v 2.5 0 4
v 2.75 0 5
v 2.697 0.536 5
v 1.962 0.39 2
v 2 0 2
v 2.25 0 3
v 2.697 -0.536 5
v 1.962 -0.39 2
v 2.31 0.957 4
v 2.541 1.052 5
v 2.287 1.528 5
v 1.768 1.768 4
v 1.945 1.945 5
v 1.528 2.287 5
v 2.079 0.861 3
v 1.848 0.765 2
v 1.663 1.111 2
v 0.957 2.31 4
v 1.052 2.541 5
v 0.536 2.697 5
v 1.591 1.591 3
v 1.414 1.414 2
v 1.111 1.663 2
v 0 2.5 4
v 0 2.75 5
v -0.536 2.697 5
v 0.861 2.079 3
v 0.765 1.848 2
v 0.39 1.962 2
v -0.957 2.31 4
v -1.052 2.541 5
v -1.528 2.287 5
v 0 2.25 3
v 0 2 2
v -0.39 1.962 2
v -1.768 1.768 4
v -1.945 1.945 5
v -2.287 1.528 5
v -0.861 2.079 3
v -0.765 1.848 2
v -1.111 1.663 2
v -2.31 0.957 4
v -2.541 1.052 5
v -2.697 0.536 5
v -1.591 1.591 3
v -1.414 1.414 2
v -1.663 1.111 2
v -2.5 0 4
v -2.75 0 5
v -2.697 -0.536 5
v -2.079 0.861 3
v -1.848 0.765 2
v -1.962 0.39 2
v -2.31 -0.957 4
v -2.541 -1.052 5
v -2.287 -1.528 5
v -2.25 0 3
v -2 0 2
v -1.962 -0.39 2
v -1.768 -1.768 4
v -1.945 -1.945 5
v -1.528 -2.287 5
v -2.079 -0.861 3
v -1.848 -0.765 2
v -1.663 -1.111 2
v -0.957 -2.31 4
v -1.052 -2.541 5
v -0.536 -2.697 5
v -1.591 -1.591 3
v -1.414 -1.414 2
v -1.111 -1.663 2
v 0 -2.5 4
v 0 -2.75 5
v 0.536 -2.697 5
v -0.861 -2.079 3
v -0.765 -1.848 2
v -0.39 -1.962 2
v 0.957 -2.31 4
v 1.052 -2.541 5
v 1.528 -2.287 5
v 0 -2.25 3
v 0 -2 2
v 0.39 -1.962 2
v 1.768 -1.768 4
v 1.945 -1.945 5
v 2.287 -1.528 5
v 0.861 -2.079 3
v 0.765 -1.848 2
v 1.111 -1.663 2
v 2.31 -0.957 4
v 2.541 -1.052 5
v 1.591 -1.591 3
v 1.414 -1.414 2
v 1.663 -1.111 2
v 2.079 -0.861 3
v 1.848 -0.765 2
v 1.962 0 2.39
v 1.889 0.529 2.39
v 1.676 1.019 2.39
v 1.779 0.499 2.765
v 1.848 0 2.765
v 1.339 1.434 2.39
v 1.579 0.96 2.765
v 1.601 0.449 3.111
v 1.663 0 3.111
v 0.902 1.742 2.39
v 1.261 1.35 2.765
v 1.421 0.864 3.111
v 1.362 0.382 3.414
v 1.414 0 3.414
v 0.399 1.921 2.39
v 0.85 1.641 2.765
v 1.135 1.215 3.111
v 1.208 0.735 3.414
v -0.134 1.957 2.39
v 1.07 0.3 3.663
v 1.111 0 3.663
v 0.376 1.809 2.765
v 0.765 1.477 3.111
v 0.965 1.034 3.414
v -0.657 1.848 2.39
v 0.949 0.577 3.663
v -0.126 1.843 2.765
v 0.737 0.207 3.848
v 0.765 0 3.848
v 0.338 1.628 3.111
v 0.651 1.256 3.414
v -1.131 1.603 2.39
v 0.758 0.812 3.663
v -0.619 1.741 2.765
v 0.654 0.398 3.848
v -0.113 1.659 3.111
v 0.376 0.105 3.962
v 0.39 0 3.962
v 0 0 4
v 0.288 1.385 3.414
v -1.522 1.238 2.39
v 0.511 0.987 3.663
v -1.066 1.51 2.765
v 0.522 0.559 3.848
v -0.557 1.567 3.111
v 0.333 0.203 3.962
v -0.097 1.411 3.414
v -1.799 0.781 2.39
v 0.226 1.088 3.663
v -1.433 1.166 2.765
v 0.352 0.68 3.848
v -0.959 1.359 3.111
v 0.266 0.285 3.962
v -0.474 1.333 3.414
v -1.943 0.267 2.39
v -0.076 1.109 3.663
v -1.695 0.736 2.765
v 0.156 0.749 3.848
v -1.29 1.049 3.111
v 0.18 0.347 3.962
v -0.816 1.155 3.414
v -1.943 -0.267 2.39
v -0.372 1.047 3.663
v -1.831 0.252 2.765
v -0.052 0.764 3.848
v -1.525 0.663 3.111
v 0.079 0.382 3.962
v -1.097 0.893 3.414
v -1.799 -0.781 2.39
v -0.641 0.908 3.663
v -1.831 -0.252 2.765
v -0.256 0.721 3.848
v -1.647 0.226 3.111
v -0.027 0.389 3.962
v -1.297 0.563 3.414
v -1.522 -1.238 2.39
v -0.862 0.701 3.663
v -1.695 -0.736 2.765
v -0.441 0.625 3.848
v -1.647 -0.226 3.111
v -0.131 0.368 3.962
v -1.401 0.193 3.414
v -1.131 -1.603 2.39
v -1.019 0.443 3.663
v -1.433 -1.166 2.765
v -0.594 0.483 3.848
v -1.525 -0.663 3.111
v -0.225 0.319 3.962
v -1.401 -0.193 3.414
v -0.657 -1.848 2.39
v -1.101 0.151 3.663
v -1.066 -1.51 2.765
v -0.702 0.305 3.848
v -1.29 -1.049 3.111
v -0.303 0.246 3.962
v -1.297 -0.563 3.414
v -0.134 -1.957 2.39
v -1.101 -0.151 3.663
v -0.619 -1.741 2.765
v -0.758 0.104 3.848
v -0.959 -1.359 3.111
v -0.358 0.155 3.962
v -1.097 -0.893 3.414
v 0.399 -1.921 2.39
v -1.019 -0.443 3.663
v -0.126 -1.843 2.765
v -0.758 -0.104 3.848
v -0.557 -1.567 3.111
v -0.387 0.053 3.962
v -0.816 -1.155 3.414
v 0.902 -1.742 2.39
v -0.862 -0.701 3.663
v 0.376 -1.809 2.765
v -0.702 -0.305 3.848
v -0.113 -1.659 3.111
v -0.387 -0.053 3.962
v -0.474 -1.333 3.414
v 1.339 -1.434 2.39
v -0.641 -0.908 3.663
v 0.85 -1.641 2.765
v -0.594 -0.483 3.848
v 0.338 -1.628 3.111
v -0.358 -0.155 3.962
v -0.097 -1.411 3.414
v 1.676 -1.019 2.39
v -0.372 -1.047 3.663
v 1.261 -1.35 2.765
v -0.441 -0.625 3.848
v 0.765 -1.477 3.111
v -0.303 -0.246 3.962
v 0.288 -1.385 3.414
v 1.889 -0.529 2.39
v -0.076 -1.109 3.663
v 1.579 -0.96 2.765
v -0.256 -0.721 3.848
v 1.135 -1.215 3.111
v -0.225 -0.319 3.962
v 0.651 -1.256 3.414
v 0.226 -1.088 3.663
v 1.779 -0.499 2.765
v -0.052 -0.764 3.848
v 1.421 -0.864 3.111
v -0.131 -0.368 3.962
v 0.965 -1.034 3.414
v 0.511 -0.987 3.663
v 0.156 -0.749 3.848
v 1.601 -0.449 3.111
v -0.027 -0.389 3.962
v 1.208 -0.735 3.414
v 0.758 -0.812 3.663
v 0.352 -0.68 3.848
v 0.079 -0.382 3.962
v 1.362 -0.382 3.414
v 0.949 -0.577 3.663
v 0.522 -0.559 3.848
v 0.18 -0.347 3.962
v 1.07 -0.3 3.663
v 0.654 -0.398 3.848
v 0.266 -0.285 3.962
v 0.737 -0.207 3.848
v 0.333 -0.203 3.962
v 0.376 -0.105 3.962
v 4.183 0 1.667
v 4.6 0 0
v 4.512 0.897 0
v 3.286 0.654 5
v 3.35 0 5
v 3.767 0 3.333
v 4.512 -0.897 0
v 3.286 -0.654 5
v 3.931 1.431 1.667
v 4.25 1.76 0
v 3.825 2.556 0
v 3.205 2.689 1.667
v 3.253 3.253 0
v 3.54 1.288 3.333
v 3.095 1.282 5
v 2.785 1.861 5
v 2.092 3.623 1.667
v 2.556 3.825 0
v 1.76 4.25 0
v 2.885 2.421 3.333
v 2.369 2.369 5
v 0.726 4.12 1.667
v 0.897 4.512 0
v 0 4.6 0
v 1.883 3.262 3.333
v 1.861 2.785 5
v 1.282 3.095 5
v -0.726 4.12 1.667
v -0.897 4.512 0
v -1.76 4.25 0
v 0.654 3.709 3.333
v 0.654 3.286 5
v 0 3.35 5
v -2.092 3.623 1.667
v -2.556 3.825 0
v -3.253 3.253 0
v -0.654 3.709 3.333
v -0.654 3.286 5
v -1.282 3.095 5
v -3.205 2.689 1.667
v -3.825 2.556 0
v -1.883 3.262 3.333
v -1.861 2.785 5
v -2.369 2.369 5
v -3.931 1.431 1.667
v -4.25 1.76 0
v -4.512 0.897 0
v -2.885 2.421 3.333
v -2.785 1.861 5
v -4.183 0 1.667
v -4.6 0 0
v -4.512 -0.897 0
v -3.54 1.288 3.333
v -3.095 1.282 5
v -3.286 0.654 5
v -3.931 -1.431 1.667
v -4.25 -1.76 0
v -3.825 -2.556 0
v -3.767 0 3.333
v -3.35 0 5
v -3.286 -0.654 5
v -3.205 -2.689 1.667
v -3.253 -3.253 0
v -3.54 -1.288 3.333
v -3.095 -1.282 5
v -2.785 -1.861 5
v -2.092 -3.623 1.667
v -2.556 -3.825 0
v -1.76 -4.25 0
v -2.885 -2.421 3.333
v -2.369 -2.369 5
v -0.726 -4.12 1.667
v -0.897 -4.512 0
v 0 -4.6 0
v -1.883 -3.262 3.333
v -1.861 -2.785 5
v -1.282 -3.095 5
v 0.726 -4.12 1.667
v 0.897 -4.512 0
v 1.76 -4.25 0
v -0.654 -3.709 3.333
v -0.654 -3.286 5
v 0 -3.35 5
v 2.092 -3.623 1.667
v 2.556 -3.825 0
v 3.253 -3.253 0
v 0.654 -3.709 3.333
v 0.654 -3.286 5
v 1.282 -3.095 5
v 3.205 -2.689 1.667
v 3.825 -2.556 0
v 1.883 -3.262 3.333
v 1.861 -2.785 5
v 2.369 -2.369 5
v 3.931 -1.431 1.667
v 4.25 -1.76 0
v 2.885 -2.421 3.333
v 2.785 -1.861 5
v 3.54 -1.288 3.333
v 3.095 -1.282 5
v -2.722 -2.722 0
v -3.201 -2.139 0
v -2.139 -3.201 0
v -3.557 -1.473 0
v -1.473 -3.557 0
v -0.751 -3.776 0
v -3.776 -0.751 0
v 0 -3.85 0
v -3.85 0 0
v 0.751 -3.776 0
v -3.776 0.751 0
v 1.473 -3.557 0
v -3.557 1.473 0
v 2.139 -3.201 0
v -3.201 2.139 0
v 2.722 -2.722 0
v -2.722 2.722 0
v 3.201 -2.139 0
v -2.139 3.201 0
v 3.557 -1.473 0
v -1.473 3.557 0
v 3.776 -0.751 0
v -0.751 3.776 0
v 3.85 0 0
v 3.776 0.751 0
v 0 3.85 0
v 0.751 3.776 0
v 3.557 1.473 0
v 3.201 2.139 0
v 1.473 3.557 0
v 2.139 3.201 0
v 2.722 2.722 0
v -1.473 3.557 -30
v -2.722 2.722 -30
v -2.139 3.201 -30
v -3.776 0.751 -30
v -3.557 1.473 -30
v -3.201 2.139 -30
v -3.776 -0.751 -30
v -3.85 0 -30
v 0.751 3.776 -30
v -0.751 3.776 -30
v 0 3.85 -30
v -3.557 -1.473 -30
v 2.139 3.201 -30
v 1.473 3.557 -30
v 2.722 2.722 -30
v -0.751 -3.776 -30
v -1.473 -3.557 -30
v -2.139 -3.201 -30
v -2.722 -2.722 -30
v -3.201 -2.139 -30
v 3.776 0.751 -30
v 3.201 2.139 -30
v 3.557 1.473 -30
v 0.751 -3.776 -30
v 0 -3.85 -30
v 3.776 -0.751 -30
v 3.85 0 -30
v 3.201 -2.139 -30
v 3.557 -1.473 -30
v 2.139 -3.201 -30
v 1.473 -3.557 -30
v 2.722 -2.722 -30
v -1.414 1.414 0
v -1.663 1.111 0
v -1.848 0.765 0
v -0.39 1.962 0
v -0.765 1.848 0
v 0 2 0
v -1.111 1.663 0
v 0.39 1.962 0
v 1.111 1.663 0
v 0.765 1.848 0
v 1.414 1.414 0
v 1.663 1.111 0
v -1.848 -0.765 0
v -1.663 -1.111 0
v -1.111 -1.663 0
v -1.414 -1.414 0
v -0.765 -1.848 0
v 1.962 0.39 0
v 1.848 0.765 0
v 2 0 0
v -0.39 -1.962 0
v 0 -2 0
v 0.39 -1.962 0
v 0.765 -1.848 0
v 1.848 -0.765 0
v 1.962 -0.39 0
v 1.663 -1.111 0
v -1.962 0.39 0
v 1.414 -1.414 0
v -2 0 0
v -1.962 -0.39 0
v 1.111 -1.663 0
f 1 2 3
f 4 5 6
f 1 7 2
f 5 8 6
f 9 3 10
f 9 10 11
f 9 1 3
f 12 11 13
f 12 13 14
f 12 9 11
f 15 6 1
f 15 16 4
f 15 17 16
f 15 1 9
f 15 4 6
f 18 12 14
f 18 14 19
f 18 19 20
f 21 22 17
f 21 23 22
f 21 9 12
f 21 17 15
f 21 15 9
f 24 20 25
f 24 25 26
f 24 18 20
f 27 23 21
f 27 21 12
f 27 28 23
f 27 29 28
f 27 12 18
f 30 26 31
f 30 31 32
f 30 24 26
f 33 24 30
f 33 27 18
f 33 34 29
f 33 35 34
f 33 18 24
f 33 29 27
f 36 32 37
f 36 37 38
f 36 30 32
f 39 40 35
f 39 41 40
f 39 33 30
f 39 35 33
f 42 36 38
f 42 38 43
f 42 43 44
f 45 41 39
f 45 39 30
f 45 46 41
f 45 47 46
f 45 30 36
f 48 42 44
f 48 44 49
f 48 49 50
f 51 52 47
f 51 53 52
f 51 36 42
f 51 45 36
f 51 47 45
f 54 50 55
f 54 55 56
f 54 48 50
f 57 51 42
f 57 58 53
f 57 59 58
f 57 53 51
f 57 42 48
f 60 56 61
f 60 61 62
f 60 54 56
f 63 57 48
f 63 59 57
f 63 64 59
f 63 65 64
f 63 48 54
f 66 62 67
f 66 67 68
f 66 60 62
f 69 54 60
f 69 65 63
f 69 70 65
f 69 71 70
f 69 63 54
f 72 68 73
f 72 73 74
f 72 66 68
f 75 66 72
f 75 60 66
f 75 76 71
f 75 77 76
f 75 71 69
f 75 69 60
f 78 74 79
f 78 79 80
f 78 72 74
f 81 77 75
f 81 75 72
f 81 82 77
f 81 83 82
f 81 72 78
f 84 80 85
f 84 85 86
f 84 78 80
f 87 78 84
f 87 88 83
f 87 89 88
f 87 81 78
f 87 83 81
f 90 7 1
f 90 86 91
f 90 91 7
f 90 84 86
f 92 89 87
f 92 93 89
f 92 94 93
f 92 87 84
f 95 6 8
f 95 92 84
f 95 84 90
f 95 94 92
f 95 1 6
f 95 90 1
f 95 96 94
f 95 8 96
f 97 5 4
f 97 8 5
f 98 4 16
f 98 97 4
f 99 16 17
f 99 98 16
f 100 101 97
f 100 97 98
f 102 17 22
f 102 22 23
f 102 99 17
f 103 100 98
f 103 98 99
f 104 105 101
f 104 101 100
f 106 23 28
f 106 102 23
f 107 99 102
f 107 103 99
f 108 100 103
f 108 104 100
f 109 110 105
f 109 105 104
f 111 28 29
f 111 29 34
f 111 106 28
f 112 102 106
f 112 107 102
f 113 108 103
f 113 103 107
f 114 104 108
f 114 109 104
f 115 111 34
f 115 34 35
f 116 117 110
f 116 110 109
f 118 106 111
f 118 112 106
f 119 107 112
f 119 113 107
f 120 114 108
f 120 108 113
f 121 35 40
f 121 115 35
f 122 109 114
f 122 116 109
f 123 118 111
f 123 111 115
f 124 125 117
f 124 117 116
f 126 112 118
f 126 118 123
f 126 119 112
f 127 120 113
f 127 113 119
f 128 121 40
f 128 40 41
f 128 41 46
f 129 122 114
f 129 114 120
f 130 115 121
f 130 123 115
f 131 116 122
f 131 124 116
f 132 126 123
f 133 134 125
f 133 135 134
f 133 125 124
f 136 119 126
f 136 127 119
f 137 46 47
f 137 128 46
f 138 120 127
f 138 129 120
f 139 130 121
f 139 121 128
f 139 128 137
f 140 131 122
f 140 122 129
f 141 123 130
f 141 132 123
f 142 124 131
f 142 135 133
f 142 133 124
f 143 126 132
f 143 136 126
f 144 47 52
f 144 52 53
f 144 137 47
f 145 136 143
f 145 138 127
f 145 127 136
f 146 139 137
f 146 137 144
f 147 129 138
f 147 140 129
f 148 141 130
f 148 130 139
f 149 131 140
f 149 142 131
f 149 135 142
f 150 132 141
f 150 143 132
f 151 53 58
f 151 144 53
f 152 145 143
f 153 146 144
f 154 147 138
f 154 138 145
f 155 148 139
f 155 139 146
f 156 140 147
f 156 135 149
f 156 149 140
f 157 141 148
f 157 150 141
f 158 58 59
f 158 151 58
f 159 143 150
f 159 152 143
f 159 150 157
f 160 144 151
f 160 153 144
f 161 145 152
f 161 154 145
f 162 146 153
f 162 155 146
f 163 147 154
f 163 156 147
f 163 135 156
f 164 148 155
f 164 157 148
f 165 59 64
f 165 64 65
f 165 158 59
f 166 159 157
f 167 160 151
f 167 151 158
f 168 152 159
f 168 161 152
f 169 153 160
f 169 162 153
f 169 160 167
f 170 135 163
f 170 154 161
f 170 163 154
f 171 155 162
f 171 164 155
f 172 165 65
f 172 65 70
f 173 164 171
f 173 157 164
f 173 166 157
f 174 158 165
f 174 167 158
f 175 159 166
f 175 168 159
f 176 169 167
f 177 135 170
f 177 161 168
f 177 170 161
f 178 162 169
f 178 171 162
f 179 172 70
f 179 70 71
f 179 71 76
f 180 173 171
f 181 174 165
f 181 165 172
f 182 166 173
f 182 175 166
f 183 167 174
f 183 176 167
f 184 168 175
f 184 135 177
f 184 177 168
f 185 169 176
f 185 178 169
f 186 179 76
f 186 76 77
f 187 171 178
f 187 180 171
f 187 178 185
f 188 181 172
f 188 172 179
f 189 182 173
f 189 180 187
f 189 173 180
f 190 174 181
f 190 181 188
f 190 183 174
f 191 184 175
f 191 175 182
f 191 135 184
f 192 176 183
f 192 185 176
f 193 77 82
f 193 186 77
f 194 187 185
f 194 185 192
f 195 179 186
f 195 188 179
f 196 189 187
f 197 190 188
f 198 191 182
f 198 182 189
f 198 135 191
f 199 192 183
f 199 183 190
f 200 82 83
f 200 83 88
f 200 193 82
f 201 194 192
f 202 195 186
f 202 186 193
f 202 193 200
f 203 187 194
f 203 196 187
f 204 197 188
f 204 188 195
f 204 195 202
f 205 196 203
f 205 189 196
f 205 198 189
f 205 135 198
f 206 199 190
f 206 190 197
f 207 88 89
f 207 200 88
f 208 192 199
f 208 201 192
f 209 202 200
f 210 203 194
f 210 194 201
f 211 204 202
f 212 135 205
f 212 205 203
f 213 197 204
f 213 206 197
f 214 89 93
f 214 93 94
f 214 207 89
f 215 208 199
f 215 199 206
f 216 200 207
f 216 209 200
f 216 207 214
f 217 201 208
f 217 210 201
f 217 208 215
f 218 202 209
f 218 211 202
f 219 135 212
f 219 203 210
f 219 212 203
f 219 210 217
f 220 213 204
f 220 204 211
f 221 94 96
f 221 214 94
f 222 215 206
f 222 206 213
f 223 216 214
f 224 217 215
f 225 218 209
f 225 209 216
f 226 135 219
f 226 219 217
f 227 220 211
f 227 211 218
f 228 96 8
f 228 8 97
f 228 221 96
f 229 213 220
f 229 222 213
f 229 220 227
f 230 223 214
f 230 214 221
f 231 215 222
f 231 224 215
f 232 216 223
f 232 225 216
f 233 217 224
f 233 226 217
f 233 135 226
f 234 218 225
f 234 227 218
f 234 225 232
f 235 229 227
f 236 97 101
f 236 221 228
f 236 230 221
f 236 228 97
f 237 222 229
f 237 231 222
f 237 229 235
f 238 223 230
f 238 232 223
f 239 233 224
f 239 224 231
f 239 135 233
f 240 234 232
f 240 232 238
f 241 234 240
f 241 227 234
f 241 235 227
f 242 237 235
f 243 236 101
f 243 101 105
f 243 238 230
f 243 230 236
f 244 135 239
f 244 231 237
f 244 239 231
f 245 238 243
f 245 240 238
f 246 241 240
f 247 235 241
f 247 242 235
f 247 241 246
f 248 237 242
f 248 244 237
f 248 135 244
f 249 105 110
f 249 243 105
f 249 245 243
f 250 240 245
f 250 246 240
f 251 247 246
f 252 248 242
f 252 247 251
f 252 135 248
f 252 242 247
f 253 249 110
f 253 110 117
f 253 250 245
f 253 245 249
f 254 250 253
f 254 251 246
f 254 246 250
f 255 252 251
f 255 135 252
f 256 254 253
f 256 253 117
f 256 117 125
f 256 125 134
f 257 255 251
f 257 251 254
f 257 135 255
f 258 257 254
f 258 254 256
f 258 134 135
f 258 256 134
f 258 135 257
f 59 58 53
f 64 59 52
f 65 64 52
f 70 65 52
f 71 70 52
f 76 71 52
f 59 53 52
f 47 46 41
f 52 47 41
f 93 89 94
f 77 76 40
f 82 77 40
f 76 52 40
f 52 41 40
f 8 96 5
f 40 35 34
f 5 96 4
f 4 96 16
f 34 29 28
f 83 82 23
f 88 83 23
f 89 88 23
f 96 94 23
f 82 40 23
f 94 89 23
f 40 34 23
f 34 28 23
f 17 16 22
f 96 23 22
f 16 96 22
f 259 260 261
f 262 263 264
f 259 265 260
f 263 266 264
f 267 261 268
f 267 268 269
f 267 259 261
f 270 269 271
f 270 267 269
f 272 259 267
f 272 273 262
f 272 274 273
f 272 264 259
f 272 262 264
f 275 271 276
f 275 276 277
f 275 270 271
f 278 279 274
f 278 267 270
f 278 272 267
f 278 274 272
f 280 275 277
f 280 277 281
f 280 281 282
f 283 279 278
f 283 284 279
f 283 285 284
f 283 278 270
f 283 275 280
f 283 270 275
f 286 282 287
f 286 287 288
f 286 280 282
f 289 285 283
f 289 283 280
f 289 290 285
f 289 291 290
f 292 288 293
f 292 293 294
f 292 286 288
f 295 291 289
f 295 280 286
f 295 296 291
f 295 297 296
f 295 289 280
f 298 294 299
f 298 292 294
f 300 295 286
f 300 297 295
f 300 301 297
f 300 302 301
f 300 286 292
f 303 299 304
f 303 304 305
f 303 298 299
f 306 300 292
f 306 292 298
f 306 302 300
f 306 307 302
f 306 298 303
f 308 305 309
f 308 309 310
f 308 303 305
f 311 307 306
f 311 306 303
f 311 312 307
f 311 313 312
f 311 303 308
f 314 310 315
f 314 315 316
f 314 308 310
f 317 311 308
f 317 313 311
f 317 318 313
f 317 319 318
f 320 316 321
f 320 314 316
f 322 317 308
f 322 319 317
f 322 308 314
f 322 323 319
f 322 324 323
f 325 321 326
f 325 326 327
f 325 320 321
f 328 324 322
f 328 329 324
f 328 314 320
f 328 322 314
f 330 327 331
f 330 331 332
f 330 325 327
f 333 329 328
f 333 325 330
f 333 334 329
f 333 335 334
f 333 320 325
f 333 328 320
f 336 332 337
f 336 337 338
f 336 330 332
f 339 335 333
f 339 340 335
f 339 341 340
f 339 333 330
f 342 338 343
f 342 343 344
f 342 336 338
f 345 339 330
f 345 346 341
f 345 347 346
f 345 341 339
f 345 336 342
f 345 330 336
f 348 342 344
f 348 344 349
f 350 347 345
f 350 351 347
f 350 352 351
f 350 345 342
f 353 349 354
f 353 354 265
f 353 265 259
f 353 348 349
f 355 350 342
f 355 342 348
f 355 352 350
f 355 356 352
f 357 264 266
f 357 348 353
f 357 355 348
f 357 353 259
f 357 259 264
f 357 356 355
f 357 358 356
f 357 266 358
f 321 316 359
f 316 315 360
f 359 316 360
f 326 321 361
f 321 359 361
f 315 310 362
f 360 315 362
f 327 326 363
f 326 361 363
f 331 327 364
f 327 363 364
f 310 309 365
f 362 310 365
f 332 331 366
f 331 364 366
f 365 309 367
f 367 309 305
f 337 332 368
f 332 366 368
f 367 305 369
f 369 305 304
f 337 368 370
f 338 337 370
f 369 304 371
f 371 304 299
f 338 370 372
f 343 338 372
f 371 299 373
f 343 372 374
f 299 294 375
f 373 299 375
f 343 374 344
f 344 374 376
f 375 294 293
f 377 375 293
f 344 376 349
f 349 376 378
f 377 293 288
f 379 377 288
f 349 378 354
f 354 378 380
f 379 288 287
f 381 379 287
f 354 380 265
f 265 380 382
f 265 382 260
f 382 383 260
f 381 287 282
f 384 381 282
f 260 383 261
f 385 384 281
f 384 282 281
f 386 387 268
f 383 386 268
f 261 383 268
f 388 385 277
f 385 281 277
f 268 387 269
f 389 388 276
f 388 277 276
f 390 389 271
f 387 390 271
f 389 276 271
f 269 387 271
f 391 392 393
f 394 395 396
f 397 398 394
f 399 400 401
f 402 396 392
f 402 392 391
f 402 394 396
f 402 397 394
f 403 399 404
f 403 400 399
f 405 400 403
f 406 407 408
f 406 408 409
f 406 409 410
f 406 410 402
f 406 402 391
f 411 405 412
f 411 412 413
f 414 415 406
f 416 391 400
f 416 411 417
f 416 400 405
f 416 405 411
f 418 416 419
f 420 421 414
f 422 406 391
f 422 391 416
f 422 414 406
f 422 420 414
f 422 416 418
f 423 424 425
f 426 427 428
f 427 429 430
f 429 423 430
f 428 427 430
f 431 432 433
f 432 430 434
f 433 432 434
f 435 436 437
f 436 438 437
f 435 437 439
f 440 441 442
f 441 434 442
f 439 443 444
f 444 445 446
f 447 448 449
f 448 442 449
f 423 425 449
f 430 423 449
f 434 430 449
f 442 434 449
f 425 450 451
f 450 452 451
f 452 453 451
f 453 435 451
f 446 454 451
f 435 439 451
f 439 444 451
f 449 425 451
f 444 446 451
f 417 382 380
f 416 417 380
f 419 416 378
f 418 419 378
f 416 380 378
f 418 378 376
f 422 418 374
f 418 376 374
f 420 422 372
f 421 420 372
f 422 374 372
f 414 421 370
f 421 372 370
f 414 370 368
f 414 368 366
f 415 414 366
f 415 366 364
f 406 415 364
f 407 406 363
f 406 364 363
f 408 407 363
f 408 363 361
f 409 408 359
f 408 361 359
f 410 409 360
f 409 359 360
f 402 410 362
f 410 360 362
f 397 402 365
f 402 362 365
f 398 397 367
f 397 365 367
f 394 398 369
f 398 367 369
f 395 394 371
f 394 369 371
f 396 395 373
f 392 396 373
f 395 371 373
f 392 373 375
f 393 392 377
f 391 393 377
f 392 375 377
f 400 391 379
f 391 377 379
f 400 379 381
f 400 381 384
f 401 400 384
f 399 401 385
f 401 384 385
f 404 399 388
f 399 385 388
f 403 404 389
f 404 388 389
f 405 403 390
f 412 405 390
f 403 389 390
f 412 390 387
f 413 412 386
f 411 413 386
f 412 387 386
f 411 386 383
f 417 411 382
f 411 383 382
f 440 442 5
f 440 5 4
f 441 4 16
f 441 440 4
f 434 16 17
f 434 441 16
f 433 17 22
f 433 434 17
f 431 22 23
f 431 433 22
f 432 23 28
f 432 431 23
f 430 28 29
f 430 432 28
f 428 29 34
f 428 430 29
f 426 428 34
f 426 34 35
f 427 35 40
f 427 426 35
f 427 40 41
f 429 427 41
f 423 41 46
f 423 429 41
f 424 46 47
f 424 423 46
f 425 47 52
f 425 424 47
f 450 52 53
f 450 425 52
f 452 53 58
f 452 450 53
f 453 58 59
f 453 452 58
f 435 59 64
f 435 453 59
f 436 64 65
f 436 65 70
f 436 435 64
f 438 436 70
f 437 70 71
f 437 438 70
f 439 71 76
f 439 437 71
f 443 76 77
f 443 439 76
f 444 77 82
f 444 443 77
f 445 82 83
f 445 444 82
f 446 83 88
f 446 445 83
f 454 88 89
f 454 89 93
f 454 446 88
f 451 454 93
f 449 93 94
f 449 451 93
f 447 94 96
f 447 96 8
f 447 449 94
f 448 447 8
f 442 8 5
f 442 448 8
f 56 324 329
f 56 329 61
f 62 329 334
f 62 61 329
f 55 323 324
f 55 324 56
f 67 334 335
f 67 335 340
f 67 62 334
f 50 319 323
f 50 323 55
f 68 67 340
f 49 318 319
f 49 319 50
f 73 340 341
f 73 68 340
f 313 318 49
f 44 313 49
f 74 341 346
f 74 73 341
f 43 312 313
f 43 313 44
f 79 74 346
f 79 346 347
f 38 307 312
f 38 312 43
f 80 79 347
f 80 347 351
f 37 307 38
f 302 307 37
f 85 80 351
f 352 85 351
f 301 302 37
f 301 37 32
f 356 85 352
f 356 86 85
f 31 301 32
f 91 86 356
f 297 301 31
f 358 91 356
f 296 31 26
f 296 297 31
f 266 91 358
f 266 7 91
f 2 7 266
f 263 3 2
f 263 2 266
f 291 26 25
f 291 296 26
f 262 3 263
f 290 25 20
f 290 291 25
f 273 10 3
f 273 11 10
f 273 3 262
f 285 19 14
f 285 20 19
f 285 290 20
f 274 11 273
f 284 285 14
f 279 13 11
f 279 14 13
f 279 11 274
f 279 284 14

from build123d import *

# Parameters (mm, degrees)
ESQUISSE1_R        = 4.85
ESQUISSE1_R_2      = 2
BOSS_EXTRU_1_DEPTH = 5
CHANFREIN1_SIZE    = 6
CHANFREIN1_SIZE_2  = 1.5
CHANFREIN2_SIZE    = 0.75
CHANFREIN2_SIZE2   = 3
ESQUISSE4_R        = 2
BOSS_EXTRU_2_DEPTH = 2
CONG_1_R           = 2
ESQUISSE5_R        = 3.85
BOSS_EXTRU_3_DEPTH = 30


# Some blends are built 0.0001 mm under size
with BuildPart() as part:
    # Esquisse1 → Boss.-Extru.1 (new body)
    with BuildSketch(Plane.XY):
        Circle(ESQUISSE1_R)
        Circle(ESQUISSE1_R_2, mode=Mode.SUBTRACT)
    extrude(amount=BOSS_EXTRU_1_DEPTH)

    # Chanfrein1
    # the kernel refuses this chamfer: 6, 1.5 mm, written as the material it takes off along each edge
    with BuildSketch(Plane(origin=(0, 0, 5), x_dir=(1, 0, 0), z_dir=(0, -1, 0))) as chanfrein1_piece_1:
        Polygon((4.85, -CHANFREIN1_SIZE), (4.85 - CHANFREIN1_SIZE_2, 0), (4.85, 0), align=None)
    revolve(axis=Axis((0, 0, 5), (0, 0, 1)), mode=Mode.SUBTRACT)

    # Chanfrein2
    chanfrein2_edges = [part.edges().sort_by_distance(p)[0] for p in [
        (-2, 0, 5),
    ]]
    chanfrein2_side = [part.faces().sort_by_distance(p)[0] for p in [
        (-3.255247691, 0, 5),
    ]]
    chamfer(chanfrein2_edges, length=CHANFREIN2_SIZE, length2=CHANFREIN2_SIZE2, reference=chanfrein2_side[0])

    # Esquisse5 → Boss.-Extru.3 (add)
    with BuildSketch(Plane(origin=(0, 0, 0), x_dir=(-1, 0, 0), z_dir=(0, 0, -1))):
        with Locations(Location((0, 0, 0), (0, 0, 180))):
            Circle(ESQUISSE5_R)
    extrude(amount=BOSS_EXTRU_3_DEPTH)


with BuildPart() as body_2:
    # Esquisse4 → Boss.-Extru.2 (new body)
    with BuildSketch(Plane.XY.offset(2)):
        Circle(ESQUISSE4_R)
    extrude(amount=BOSS_EXTRU_2_DEPTH)

    # Congé1
    cong_1_edges = [body_2.edges().sort_by_distance(p)[0] for p in [
        (-2, 0, 4),
    ]]
    fillet(cong_1_edges, radius=CONG_1_R - 0.0001)  # a hair under: the kernel refuses the full size


solid = Compound([part.part, body_2.part])
